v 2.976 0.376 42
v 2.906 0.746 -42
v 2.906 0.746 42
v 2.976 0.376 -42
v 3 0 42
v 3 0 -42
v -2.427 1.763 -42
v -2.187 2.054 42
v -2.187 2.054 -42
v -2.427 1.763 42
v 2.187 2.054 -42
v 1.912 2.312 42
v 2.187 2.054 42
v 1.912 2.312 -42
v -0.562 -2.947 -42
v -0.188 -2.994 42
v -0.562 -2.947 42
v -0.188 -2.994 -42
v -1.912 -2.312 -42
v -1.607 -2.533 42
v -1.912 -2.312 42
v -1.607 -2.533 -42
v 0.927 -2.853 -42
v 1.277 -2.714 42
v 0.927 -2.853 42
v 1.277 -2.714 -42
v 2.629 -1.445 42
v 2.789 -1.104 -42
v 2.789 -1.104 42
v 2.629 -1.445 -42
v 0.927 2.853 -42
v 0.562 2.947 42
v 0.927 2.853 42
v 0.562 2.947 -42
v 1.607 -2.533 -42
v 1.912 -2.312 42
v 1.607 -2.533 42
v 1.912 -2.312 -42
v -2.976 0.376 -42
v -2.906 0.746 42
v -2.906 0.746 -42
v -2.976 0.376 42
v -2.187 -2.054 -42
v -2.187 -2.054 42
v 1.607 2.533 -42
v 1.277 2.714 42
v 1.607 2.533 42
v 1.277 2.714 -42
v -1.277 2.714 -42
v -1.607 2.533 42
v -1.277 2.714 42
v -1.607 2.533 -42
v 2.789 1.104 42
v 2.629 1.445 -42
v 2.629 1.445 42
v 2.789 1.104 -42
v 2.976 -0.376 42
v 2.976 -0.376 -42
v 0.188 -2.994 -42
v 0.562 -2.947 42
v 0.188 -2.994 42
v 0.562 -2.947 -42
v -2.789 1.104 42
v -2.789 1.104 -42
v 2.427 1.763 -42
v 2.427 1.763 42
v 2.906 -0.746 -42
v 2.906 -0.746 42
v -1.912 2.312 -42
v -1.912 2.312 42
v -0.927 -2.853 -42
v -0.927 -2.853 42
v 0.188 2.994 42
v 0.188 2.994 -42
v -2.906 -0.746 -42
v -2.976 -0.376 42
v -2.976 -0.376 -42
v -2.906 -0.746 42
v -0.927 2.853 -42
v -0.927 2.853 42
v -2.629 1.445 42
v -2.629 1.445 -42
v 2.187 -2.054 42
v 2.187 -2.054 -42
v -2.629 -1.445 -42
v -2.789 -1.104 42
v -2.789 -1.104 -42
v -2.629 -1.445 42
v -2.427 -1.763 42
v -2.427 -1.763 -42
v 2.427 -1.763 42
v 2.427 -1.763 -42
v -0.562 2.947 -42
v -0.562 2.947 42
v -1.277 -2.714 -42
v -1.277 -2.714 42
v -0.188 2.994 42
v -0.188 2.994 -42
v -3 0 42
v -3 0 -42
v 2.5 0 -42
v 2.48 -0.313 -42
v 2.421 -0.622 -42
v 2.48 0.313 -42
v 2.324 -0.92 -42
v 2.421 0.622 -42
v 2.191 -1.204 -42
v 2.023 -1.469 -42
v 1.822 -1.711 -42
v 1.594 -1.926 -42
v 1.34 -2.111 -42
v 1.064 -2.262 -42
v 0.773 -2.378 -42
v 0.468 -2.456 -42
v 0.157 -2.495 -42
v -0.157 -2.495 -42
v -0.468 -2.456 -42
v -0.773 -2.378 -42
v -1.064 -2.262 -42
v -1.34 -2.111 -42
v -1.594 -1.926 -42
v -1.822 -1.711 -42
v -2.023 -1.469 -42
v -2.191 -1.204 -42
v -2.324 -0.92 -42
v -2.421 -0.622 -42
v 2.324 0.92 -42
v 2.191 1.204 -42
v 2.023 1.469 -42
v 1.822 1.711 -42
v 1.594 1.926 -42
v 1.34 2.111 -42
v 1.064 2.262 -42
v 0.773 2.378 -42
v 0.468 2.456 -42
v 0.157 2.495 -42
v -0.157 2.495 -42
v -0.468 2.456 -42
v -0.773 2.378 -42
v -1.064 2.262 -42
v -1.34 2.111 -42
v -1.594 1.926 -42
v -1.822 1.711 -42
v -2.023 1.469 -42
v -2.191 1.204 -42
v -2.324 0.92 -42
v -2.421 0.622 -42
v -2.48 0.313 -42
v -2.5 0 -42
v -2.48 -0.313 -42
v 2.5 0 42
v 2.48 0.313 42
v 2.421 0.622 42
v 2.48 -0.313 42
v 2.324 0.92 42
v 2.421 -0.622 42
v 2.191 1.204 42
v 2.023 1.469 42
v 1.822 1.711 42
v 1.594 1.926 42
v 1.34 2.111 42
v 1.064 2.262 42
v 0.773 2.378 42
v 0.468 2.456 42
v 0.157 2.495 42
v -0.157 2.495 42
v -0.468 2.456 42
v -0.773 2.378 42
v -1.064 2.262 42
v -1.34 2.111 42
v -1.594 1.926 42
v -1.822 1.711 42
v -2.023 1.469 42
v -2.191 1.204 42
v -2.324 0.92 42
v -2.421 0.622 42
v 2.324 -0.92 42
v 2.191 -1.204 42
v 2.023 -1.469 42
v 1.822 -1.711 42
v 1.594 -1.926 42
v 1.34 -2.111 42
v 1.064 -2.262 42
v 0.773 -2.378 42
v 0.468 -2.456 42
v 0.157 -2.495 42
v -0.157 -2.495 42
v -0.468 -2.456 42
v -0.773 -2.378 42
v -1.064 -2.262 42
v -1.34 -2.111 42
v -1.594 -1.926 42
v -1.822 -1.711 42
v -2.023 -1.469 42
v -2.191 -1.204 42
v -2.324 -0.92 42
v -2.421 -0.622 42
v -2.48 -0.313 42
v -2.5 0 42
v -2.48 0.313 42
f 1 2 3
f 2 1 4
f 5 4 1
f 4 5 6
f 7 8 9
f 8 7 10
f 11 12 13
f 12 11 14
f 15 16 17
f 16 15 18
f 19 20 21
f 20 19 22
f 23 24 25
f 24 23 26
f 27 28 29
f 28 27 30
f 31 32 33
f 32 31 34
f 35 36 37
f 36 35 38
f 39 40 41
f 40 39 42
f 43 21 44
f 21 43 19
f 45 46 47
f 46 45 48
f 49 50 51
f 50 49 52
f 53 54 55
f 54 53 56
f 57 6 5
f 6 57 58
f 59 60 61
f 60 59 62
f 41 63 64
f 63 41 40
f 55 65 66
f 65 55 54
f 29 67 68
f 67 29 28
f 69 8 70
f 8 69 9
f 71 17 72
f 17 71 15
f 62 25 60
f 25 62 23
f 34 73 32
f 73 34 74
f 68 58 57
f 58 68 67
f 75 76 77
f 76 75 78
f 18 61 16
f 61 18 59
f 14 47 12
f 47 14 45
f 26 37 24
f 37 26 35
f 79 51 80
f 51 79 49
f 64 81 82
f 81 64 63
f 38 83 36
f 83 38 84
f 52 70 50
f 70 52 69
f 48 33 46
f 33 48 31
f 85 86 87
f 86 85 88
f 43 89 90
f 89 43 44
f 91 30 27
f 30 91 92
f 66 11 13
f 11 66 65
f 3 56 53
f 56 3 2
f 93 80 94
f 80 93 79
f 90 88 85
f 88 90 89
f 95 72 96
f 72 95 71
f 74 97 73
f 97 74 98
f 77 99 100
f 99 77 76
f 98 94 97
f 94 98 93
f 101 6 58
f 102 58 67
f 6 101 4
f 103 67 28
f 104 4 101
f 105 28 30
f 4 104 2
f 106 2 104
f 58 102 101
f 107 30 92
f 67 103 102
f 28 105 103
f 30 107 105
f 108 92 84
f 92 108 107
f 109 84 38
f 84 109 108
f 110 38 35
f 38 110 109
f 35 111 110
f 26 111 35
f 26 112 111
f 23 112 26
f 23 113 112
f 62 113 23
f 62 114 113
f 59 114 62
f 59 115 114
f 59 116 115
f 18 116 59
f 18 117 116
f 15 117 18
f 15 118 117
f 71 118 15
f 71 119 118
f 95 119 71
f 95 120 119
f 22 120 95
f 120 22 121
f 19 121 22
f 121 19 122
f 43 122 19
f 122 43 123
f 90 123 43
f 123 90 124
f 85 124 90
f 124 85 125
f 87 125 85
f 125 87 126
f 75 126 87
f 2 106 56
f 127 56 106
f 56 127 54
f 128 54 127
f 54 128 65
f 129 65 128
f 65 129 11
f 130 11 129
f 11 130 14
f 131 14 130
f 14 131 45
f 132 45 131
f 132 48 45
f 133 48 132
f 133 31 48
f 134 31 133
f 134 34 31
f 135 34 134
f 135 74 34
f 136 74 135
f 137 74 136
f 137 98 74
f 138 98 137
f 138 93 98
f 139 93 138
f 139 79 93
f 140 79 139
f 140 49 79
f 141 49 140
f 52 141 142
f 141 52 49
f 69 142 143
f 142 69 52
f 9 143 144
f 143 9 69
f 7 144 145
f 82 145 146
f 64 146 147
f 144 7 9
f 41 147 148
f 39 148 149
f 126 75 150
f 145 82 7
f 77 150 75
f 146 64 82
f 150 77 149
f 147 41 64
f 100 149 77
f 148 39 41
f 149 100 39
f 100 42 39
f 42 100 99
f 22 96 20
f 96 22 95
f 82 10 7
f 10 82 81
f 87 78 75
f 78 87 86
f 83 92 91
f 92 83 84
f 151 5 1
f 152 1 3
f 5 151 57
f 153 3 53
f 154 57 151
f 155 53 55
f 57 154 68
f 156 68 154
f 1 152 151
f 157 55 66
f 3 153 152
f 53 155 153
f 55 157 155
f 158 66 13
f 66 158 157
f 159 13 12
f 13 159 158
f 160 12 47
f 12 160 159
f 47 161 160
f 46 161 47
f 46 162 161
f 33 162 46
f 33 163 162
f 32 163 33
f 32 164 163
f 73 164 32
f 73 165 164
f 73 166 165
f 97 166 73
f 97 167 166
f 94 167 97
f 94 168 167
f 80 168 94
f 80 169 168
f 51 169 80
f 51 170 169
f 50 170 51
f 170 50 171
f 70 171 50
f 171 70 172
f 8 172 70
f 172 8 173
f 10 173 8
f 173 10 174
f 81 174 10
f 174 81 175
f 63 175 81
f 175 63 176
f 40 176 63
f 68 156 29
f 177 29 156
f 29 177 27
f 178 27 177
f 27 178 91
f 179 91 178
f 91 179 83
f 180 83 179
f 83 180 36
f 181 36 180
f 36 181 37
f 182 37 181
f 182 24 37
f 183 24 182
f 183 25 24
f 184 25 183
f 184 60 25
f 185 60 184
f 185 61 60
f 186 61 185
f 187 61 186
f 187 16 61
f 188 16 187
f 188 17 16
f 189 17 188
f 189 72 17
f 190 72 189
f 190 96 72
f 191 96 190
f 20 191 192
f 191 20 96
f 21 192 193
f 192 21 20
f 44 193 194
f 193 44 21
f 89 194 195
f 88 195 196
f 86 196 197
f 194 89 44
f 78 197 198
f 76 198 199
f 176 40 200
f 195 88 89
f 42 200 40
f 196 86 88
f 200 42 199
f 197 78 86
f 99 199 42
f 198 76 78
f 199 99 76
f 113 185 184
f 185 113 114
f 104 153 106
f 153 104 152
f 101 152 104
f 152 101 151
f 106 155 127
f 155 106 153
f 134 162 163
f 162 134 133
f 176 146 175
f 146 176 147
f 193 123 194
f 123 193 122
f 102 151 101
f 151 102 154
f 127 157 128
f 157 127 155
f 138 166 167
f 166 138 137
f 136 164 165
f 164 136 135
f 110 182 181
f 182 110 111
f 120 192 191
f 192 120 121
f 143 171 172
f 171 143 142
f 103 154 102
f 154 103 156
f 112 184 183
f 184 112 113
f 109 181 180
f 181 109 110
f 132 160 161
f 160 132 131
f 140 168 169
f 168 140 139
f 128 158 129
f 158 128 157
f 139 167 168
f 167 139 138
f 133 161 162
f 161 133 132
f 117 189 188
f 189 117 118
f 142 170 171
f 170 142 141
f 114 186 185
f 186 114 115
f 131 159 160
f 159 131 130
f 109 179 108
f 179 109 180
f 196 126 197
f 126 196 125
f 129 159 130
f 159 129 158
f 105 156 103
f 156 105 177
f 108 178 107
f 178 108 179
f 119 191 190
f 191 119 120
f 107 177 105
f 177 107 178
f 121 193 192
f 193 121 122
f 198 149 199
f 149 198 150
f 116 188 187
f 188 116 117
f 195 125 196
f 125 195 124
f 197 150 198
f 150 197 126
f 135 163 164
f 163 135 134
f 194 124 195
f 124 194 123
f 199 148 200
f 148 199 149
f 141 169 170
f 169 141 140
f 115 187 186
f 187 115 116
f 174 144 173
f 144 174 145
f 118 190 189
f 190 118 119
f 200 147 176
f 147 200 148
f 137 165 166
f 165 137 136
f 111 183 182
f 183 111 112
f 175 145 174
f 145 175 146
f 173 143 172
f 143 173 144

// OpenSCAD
$fn = 50;


difference() {
	union() {
		translate(v = [0, 0, -42.0000000000]) {
			cylinder(h = 84, r = 3.0000000000);
		}
	}
	union() {
		translate(v = [0, 0, -100.0000000000]) {
			cylinder(h = 200, r = 2.5000000000);
		}
	}
}
